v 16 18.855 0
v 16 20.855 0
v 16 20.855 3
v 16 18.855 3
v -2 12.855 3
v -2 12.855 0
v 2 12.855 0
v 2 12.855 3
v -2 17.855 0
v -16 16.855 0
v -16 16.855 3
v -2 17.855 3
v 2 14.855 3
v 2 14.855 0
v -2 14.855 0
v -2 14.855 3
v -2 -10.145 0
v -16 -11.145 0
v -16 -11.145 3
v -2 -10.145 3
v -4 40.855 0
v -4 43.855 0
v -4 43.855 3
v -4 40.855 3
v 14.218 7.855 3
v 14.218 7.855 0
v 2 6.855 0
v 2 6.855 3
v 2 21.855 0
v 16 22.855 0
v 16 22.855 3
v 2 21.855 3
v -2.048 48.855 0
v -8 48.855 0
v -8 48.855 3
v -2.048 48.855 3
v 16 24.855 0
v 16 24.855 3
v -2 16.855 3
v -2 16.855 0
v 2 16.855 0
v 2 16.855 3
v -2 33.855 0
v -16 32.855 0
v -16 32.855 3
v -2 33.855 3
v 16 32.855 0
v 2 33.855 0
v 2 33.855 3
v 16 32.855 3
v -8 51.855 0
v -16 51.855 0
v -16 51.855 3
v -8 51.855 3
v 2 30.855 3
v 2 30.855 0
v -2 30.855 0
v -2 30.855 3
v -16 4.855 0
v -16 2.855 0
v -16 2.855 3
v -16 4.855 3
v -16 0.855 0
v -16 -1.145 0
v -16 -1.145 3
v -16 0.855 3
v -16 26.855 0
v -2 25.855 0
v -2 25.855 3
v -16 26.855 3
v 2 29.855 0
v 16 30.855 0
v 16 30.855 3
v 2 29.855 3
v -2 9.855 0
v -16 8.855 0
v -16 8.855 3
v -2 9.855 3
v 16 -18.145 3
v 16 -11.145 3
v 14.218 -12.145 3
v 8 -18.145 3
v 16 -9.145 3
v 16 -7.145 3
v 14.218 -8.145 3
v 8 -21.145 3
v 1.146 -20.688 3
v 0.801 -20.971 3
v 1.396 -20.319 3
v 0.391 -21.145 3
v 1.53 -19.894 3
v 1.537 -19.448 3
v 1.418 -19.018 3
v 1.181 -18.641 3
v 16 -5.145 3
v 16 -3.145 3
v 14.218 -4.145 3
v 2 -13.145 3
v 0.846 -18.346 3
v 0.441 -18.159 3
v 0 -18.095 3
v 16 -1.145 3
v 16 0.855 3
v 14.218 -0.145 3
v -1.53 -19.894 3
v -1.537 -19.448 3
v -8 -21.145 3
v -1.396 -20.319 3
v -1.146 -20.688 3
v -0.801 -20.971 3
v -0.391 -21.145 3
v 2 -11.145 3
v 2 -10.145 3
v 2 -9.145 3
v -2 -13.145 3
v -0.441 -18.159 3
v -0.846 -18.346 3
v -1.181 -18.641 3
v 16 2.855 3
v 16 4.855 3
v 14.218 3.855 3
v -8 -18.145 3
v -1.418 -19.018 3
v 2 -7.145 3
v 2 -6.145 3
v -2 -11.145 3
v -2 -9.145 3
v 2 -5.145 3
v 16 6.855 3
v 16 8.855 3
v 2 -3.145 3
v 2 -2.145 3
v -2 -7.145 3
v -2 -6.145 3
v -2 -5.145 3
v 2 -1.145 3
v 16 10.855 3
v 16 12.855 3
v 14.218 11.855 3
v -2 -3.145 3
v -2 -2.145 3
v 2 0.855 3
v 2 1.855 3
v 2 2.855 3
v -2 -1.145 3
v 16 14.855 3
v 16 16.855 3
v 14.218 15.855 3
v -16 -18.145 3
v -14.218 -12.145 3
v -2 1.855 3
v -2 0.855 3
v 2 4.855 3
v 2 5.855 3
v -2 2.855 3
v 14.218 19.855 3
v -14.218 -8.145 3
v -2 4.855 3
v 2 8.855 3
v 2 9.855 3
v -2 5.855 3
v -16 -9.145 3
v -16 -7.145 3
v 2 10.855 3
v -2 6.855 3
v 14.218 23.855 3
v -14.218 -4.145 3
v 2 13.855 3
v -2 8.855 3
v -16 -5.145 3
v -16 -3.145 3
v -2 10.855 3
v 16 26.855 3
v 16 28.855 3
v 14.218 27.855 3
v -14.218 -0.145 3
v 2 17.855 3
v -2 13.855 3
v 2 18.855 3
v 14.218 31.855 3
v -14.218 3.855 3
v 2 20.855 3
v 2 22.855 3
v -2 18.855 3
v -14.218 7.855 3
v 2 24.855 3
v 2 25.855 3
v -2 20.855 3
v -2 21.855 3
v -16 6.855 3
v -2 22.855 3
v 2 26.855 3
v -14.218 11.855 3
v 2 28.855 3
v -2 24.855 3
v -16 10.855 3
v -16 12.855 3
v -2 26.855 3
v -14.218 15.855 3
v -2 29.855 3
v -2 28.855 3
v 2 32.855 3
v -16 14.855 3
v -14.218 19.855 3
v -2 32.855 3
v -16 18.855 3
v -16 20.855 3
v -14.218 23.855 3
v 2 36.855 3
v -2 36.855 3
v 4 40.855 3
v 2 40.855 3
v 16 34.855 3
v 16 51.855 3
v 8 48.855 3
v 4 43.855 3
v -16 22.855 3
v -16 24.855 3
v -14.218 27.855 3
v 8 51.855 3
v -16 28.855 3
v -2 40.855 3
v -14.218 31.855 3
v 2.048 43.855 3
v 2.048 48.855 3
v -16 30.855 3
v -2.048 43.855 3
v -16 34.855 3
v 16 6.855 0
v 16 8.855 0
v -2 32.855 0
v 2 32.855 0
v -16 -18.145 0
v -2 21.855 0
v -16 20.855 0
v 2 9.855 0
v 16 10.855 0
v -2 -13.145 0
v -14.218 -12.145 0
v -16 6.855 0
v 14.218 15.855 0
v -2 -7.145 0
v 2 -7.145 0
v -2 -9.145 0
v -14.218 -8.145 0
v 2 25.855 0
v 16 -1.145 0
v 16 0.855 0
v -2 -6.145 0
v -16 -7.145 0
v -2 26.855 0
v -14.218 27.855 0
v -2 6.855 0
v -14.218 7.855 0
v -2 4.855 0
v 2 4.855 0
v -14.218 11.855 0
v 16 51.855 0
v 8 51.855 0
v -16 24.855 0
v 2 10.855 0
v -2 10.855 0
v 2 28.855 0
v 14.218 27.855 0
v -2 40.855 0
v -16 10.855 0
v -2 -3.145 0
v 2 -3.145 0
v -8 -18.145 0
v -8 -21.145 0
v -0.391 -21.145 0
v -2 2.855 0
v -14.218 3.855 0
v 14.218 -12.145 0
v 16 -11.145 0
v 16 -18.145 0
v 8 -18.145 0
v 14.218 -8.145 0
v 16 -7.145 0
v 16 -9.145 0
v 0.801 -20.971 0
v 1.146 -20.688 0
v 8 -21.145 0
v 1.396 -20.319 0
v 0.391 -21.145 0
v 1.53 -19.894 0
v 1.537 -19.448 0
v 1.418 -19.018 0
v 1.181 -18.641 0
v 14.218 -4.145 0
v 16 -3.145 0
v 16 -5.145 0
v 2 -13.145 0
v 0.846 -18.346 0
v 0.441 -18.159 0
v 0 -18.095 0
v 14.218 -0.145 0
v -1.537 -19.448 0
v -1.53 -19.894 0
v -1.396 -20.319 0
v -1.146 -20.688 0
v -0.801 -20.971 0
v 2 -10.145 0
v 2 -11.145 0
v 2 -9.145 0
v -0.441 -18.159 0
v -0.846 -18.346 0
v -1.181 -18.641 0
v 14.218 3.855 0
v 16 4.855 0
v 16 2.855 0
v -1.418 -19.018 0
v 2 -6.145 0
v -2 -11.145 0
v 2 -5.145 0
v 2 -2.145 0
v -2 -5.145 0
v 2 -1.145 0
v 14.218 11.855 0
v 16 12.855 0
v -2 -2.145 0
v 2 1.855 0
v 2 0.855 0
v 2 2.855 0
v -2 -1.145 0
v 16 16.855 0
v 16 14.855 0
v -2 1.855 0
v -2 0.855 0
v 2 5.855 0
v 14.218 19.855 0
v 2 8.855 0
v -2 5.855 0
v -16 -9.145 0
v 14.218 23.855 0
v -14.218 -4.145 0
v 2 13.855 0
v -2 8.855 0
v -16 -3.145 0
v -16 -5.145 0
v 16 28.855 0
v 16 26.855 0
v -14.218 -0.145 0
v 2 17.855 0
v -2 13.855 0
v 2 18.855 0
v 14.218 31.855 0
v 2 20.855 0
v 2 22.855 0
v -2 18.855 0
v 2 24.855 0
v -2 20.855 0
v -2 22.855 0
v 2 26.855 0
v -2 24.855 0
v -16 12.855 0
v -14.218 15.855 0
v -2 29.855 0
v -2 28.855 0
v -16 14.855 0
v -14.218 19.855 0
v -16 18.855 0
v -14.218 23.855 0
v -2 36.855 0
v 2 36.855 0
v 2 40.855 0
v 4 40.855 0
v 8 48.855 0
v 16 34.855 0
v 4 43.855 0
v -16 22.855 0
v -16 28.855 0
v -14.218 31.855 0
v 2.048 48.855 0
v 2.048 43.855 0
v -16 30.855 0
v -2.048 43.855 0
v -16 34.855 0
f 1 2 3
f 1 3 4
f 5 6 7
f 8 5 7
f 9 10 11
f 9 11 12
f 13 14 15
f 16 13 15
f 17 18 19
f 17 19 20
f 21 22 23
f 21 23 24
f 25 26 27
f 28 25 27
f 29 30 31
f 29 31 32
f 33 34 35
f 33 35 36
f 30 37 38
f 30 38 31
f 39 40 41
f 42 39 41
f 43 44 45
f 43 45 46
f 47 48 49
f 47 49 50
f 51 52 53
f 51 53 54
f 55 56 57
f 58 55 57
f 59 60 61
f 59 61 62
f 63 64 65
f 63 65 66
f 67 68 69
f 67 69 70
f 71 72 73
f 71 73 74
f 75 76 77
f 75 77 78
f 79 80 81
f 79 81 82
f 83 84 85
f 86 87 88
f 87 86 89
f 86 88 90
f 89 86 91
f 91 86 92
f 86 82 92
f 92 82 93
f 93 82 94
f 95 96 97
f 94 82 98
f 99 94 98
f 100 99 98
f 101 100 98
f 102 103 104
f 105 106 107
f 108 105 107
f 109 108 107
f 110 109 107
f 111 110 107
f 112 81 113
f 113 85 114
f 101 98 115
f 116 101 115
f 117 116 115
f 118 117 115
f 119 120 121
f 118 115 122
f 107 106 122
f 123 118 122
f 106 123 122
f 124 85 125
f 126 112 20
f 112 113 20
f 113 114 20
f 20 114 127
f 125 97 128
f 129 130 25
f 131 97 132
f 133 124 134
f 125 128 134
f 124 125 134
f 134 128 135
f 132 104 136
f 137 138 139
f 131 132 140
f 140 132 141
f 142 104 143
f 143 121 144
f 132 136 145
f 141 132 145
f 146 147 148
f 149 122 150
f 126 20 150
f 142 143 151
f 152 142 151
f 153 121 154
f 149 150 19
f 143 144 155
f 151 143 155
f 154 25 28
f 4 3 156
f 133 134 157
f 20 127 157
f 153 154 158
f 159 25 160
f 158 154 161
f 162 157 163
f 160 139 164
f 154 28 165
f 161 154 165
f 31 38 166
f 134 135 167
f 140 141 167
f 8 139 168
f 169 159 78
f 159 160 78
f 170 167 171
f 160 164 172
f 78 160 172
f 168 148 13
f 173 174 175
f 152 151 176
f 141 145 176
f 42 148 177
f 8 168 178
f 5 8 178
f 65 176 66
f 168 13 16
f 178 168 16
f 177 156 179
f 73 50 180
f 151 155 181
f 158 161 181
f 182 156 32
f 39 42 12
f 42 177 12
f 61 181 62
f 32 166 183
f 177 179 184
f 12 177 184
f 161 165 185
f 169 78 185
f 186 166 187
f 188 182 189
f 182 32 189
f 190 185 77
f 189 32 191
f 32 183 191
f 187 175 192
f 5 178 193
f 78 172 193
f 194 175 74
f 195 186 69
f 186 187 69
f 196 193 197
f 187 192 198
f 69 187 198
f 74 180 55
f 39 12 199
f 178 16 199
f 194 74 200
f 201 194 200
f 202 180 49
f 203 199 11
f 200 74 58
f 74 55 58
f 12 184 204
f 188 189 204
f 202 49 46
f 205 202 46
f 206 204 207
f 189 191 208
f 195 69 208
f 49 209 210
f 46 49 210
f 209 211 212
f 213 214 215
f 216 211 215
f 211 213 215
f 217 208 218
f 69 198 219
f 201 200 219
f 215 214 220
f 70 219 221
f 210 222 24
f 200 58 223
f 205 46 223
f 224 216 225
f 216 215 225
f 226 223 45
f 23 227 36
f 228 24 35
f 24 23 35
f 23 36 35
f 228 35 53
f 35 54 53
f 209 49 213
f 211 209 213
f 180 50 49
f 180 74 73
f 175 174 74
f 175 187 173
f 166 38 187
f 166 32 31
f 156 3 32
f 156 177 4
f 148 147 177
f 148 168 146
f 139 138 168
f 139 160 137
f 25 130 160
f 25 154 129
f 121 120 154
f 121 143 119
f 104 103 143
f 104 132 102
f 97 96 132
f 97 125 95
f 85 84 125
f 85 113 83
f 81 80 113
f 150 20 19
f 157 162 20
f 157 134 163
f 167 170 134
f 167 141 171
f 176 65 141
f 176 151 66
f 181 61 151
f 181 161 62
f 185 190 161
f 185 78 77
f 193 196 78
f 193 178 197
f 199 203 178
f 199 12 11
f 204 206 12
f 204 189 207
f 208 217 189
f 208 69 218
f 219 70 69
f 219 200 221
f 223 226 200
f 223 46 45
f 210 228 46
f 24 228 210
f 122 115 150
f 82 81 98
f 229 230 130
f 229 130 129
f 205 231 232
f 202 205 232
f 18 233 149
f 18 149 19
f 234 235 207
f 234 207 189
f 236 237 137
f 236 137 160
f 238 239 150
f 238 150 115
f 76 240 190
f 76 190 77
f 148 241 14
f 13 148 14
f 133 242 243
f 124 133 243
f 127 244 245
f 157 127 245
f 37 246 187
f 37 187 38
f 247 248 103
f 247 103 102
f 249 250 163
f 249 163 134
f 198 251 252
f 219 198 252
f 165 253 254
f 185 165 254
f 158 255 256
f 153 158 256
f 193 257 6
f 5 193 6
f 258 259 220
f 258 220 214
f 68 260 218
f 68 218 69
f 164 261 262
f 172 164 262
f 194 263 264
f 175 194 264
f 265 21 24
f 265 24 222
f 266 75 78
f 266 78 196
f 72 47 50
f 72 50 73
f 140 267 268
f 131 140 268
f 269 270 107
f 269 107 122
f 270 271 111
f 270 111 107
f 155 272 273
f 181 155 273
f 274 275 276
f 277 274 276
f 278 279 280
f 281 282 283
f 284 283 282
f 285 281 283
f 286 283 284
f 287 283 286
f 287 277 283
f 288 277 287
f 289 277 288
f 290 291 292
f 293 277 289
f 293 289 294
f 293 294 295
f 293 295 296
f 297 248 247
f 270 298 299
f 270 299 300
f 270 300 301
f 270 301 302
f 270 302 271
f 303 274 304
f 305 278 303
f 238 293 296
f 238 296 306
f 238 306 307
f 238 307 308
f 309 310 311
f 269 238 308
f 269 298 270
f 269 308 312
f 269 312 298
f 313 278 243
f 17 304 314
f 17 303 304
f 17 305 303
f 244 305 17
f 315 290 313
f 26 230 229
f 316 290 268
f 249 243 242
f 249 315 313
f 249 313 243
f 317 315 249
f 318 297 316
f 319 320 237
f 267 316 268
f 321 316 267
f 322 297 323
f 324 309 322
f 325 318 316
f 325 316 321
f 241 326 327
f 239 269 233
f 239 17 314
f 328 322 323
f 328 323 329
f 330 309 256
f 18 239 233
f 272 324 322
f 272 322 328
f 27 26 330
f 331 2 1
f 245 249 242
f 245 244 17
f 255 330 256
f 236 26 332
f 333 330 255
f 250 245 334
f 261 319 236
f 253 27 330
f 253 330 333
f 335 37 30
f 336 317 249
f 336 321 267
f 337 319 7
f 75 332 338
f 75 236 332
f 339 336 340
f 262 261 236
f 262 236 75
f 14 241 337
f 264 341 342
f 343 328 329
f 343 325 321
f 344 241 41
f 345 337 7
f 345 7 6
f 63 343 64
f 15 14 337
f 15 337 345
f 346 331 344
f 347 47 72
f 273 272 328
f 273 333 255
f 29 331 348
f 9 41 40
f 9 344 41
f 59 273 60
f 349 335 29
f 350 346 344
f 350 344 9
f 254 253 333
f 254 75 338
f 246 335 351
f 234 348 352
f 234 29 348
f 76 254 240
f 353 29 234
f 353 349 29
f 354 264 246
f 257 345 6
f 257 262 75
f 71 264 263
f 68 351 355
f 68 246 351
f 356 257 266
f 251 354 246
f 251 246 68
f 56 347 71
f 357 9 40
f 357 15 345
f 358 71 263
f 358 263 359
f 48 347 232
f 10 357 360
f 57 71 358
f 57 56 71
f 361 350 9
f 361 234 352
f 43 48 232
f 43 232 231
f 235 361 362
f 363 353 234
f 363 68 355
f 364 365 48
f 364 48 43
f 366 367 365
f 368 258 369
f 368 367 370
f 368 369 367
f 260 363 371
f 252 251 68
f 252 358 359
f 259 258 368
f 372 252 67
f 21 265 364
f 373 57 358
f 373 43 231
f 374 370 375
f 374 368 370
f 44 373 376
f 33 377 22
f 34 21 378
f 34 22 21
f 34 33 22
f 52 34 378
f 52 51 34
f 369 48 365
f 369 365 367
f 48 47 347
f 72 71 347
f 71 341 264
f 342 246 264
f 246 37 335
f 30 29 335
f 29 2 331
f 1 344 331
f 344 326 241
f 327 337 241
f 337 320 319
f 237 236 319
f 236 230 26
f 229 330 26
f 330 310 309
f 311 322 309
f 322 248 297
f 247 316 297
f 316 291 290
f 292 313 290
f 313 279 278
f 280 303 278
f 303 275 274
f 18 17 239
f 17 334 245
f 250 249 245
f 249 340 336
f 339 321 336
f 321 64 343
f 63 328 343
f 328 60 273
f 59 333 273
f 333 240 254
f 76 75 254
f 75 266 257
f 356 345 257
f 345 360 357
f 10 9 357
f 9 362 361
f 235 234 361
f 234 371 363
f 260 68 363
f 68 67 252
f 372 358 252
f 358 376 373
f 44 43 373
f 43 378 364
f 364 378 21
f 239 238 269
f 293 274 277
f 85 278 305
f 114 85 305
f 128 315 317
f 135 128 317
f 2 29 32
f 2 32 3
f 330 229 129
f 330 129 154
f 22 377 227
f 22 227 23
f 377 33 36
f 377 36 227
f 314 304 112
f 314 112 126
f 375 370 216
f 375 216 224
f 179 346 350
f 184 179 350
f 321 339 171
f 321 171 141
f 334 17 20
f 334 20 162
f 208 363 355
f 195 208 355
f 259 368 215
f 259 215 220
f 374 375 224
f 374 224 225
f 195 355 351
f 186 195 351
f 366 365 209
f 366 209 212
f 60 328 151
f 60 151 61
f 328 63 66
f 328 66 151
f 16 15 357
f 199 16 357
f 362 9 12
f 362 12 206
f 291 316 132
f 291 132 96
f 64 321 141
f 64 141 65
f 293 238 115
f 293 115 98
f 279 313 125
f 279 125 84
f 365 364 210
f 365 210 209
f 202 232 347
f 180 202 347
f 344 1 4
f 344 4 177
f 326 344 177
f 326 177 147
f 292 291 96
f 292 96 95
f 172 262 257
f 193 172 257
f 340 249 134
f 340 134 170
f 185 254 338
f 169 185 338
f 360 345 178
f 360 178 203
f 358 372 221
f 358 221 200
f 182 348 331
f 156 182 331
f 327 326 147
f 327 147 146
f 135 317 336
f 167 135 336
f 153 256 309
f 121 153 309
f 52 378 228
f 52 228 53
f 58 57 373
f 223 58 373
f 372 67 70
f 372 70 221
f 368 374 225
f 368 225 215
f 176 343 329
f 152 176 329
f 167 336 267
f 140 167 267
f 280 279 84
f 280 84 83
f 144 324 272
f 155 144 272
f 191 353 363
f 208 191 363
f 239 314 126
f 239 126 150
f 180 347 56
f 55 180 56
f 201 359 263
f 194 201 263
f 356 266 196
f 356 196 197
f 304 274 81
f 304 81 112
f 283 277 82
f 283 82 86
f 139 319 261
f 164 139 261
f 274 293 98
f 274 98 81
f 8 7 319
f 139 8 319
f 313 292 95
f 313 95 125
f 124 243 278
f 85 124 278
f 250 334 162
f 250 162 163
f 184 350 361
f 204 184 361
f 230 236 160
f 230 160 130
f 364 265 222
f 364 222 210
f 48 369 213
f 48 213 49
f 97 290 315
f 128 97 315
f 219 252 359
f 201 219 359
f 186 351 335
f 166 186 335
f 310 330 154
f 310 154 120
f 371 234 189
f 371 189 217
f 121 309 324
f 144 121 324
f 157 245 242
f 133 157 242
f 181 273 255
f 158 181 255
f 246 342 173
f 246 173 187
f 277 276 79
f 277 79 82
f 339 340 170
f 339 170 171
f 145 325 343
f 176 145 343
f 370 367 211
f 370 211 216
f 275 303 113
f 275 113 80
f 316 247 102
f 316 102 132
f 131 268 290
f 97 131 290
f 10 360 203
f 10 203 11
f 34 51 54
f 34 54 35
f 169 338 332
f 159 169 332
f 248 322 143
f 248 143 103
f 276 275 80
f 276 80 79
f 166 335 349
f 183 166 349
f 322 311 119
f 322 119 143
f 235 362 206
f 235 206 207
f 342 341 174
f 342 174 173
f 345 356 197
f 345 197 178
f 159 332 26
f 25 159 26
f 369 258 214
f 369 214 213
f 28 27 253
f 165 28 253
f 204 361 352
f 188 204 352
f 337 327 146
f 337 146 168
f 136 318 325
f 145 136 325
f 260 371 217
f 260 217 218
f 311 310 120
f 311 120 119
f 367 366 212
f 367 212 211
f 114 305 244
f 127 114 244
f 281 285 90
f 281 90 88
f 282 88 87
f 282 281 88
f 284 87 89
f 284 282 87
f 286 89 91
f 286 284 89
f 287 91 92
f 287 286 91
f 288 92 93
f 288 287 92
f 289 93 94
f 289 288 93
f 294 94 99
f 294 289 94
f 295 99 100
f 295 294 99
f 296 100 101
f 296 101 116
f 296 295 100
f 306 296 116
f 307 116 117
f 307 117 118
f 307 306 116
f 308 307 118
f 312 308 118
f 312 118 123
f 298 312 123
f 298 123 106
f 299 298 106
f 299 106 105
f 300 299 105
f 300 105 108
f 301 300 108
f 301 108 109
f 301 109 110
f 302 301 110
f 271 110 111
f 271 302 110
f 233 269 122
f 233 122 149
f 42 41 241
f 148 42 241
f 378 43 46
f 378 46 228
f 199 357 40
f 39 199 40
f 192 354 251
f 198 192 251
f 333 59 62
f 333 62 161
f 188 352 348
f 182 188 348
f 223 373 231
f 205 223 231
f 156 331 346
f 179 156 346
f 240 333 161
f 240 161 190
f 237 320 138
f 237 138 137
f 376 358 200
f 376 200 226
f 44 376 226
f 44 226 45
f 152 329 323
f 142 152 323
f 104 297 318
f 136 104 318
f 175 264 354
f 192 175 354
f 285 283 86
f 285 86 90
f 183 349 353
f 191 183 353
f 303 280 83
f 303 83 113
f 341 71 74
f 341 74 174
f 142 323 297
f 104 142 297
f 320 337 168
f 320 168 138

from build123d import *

# Parameters (mm, degrees)
EXTRUDE_1_DEPTH = 3


with BuildPart() as part:
    # 草图2 → 凸台-拉伸1 (new body)
    with BuildSketch(Plane.XY):
        with BuildLine():
            Line((2.047890023, 48.855305477), (8, 48.855305477))
            Line((8, 48.855305477), (8, 51.855305477))
            Line((8, 51.855305477), (16, 51.855305477))
            Line((16, 51.855305477), (16, 34.855305477))
            Line((16, 34.855305477), (2, 33.855305477))
            Line((2, 33.855305477), (16, 32.855305477))
            Line((16, 32.855305477), (16, 30.855305477))
            Line((16, 30.855305477), (2, 29.855305477))
            Line((2, 29.855305477), (16, 28.855305477))
            Line((16, 28.855305477), (16, 26.855305477))
            Line((16, 26.855305477), (2, 25.855305477))
            Line((2, 25.855305477), (16, 24.855305477))
            Line((16, 24.855305477), (16, 22.855305477))
            Line((16, 22.855305477), (2, 21.855305477))
            Line((2, 21.855305477), (16, 20.855305477))
            Line((16, 20.855305477), (16, 18.855305477))
            Line((16, 18.855305477), (2, 17.855305477))
            Line((2, 17.855305477), (16, 16.855305477))
            Line((16, 16.855305477), (16, 14.855305477))
            Line((16, 14.855305477), (2, 13.855305477))
            Line((2, 13.855305477), (16, 12.855305477))
            Line((16, 12.855305477), (16, 10.855305477))
            Line((16, 10.855305477), (2, 9.855305477))
            Line((2, 9.855305477), (16, 8.855305477))
            Line((16, 8.855305477), (16, 6.855305477))
            Line((16, 6.855305477), (2, 5.855305477))
            Line((2, 5.855305477), (16, 4.855305477))
            Line((16, 4.855305477), (16, 2.855305477))
            Line((16, 2.855305477), (2, 1.855305477))
            Line((2, 1.855305477), (16, 0.855305477))
            Line((16, 0.855305477), (16, -1.144694523))
            Line((16, -1.144694523), (2, -2.144694523))
            Line((2, -2.144694523), (16, -3.144694523))
            Line((16, -3.144694523), (16, -5.144694523))
            Line((16, -5.144694523), (2, -6.144694523))
            Line((2, -6.144694523), (16, -7.144694523))
            Line((16, -7.144694523), (16, -9.144694523))
            Line((16, -9.144694523), (2, -10.144694523))
            Line((2, -10.144694523), (16, -11.144694523))
            Line((16, -11.144694523), (16, -18.144694523))
            Line((16, -18.144694523), (8, -18.144694523))
            Line((8, -18.144694523), (8, -21.144694523))
            Line((8, -21.144694523), (0.390512484, -21.144694523))
            ThreePointArc((0.390512484, -21.144694523), (0, -18.094694523), (-0.390512484, -21.144694523))
            Line((-0.390512484, -21.144694523), (-8, -21.144694523))
            Line((-8, -21.144694523), (-8, -18.144694523))
            Line((-8, -18.144694523), (-16, -18.144694523))
            Line((-16, -18.144694523), (-16, -11.144694523))
            Line((-16, -11.144694523), (-2, -10.144694523))
            Line((-2, -10.144694523), (-16, -9.144694523))
            Line((-16, -9.144694523), (-16, -7.144694523))
            Line((-16, -7.144694523), (-2, -6.144694523))
            Line((-2, -6.144694523), (-16, -5.144694523))
            Line((-16, -5.144694523), (-16, -3.144694523))
            Line((-16, -3.144694523), (-2, -2.144694523))
            Line((-2, -2.144694523), (-16, -1.144694523))
            Line((-16, -1.144694523), (-16, 0.855305477))
            Line((-16, 0.855305477), (-2, 1.855305477))
            Line((-2, 1.855305477), (-16, 2.855305477))
            Line((-16, 2.855305477), (-16, 4.855305477))
            Line((-16, 4.855305477), (-2, 5.855305477))
            Line((-2, 5.855305477), (-16, 6.855305477))
            Line((-16, 6.855305477), (-16, 8.855305477))
            Line((-16, 8.855305477), (-2, 9.855305477))
            Line((-2, 9.855305477), (-16, 10.855305477))
            Line((-16, 10.855305477), (-16, 12.855305477))
            Line((-16, 12.855305477), (-2, 13.855305477))
            Line((-2, 13.855305477), (-16, 14.855305477))
            Line((-16, 14.855305477), (-16, 16.855305477))
            Line((-16, 16.855305477), (-2, 17.855305477))
            Line((-2, 17.855305477), (-16, 18.855305477))
            Line((-16, 18.855305477), (-16, 20.855305477))
            Line((-16, 20.855305477), (-2, 21.855305477))
            Line((-2, 21.855305477), (-16, 22.855305477))
            Line((-16, 22.855305477), (-16, 24.855305477))
            Line((-16, 24.855305477), (-2, 25.855305477))
            Line((-2, 25.855305477), (-16, 26.855305477))
            Line((-16, 26.855305477), (-16, 28.855305477))
            Line((-16, 28.855305477), (-2, 29.855305477))
            Line((-2, 29.855305477), (-16, 30.855305477))
            Line((-16, 30.855305477), (-16, 32.855305477))
            Line((-16, 32.855305477), (-2, 33.855305477))
            Line((-2, 33.855305477), (-16, 34.855305477))
            Line((-16, 34.855305477), (-16, 51.855305477))
            Line((-16, 51.855305477), (-8, 51.855305477))
            Line((-8, 51.855305477), (-8, 48.855305477))
            Line((-8, 48.855305477), (-2.047890023, 48.855305477))
            Line((-2.047890023, 48.855305477), (-2.047890023, 43.855305477))
            Line((-2.047890023, 43.855305477), (-4, 43.855305477))
            Line((-4, 43.855305477), (-4, 40.855305477))
            Line((-4, 40.855305477), (-2, 40.855305477))
            Line((-2, 40.855305477), (-2, 36.855305477))
            Line((-2, 36.855305477), (2, 36.855305477))
            Line((2, 36.855305477), (2, 40.855305477))
            Line((2, 40.855305477), (4, 40.855305477))
            Line((4, 40.855305477), (4, 43.855305477))
            Line((4, 43.855305477), (2.047890023, 43.855305477))
            Line((2.047890023, 43.855305477), (2.047890023, 48.855305477))
        make_face()
        Polygon((-14.217878812, -12.144694523), (-2, -13.144694523), (2, -13.144694523), (14.217878812, -12.144694523), (2, -11.144694523), (-2, -11.144694523), align=None, mode=Mode.SUBTRACT)
        Polygon((2, 32.855305477), (14.217878812, 31.855305477), (2, 30.855305477), (-2, 30.855305477), (-14.217878812, 31.855305477), (-2, 32.855305477), align=None, mode=Mode.SUBTRACT)
        Polygon((2, 28.855305477), (14.217878812, 27.855305477), (2, 26.855305477), (-2, 26.855305477), (-14.217878812, 27.855305477), (-2, 28.855305477), align=None, mode=Mode.SUBTRACT)
        Polygon((2, 24.855305477), (14.217878812, 23.855305477), (2, 22.855305477), (-2, 22.855305477), (-14.217878812, 23.855305477), (-2, 24.855305477), align=None, mode=Mode.SUBTRACT)
        Polygon((2, 20.855305477), (14.217878812, 19.855305477), (2, 18.855305477), (-2, 18.855305477), (-14.217878812, 19.855305477), (-2, 20.855305477), align=None, mode=Mode.SUBTRACT)
        Polygon((2, 16.855305477), (14.217878812, 15.855305477), (2, 14.855305477), (-2, 14.855305477), (-14.217878812, 15.855305477), (-2, 16.855305477), align=None, mode=Mode.SUBTRACT)
        Polygon((2, 12.855305477), (14.217878812, 11.855305477), (2, 10.855305477), (-2, 10.855305477), (-14.217878812, 11.855305477), (-2, 12.855305477), align=None, mode=Mode.SUBTRACT)
        Polygon((2, 8.855305477), (14.217878812, 7.855305477), (2, 6.855305477), (-2, 6.855305477), (-14.217878812, 7.855305477), (-2, 8.855305477), align=None, mode=Mode.SUBTRACT)
        Polygon((2, 4.855305477), (14.217878812, 3.855305477), (2, 2.855305477), (-2, 2.855305477), (-14.217878812, 3.855305477), (-2, 4.855305477), align=None, mode=Mode.SUBTRACT)
        Polygon((2, 0.855305477), (14.217878812, -0.144694523), (2, -1.144694523), (-2, -1.144694523), (-14.217878812, -0.144694523), (-2, 0.855305477), align=None, mode=Mode.SUBTRACT)
        Polygon((2, -3.144694523), (14.217878812, -4.144694523), (2, -5.144694523), (-2, -5.144694523), (-14.217878812, -4.144694523), (-2, -3.144694523), align=None, mode=Mode.SUBTRACT)
        Polygon((2, -7.144694523), (14.217878812, -8.144694523), (2, -9.144694523), (-2, -9.144694523), (-14.217878812, -8.144694523), (-2, -7.144694523), align=None, mode=Mode.SUBTRACT)
    extrude(amount=EXTRUDE_1_DEPTH)


solid = part.part
